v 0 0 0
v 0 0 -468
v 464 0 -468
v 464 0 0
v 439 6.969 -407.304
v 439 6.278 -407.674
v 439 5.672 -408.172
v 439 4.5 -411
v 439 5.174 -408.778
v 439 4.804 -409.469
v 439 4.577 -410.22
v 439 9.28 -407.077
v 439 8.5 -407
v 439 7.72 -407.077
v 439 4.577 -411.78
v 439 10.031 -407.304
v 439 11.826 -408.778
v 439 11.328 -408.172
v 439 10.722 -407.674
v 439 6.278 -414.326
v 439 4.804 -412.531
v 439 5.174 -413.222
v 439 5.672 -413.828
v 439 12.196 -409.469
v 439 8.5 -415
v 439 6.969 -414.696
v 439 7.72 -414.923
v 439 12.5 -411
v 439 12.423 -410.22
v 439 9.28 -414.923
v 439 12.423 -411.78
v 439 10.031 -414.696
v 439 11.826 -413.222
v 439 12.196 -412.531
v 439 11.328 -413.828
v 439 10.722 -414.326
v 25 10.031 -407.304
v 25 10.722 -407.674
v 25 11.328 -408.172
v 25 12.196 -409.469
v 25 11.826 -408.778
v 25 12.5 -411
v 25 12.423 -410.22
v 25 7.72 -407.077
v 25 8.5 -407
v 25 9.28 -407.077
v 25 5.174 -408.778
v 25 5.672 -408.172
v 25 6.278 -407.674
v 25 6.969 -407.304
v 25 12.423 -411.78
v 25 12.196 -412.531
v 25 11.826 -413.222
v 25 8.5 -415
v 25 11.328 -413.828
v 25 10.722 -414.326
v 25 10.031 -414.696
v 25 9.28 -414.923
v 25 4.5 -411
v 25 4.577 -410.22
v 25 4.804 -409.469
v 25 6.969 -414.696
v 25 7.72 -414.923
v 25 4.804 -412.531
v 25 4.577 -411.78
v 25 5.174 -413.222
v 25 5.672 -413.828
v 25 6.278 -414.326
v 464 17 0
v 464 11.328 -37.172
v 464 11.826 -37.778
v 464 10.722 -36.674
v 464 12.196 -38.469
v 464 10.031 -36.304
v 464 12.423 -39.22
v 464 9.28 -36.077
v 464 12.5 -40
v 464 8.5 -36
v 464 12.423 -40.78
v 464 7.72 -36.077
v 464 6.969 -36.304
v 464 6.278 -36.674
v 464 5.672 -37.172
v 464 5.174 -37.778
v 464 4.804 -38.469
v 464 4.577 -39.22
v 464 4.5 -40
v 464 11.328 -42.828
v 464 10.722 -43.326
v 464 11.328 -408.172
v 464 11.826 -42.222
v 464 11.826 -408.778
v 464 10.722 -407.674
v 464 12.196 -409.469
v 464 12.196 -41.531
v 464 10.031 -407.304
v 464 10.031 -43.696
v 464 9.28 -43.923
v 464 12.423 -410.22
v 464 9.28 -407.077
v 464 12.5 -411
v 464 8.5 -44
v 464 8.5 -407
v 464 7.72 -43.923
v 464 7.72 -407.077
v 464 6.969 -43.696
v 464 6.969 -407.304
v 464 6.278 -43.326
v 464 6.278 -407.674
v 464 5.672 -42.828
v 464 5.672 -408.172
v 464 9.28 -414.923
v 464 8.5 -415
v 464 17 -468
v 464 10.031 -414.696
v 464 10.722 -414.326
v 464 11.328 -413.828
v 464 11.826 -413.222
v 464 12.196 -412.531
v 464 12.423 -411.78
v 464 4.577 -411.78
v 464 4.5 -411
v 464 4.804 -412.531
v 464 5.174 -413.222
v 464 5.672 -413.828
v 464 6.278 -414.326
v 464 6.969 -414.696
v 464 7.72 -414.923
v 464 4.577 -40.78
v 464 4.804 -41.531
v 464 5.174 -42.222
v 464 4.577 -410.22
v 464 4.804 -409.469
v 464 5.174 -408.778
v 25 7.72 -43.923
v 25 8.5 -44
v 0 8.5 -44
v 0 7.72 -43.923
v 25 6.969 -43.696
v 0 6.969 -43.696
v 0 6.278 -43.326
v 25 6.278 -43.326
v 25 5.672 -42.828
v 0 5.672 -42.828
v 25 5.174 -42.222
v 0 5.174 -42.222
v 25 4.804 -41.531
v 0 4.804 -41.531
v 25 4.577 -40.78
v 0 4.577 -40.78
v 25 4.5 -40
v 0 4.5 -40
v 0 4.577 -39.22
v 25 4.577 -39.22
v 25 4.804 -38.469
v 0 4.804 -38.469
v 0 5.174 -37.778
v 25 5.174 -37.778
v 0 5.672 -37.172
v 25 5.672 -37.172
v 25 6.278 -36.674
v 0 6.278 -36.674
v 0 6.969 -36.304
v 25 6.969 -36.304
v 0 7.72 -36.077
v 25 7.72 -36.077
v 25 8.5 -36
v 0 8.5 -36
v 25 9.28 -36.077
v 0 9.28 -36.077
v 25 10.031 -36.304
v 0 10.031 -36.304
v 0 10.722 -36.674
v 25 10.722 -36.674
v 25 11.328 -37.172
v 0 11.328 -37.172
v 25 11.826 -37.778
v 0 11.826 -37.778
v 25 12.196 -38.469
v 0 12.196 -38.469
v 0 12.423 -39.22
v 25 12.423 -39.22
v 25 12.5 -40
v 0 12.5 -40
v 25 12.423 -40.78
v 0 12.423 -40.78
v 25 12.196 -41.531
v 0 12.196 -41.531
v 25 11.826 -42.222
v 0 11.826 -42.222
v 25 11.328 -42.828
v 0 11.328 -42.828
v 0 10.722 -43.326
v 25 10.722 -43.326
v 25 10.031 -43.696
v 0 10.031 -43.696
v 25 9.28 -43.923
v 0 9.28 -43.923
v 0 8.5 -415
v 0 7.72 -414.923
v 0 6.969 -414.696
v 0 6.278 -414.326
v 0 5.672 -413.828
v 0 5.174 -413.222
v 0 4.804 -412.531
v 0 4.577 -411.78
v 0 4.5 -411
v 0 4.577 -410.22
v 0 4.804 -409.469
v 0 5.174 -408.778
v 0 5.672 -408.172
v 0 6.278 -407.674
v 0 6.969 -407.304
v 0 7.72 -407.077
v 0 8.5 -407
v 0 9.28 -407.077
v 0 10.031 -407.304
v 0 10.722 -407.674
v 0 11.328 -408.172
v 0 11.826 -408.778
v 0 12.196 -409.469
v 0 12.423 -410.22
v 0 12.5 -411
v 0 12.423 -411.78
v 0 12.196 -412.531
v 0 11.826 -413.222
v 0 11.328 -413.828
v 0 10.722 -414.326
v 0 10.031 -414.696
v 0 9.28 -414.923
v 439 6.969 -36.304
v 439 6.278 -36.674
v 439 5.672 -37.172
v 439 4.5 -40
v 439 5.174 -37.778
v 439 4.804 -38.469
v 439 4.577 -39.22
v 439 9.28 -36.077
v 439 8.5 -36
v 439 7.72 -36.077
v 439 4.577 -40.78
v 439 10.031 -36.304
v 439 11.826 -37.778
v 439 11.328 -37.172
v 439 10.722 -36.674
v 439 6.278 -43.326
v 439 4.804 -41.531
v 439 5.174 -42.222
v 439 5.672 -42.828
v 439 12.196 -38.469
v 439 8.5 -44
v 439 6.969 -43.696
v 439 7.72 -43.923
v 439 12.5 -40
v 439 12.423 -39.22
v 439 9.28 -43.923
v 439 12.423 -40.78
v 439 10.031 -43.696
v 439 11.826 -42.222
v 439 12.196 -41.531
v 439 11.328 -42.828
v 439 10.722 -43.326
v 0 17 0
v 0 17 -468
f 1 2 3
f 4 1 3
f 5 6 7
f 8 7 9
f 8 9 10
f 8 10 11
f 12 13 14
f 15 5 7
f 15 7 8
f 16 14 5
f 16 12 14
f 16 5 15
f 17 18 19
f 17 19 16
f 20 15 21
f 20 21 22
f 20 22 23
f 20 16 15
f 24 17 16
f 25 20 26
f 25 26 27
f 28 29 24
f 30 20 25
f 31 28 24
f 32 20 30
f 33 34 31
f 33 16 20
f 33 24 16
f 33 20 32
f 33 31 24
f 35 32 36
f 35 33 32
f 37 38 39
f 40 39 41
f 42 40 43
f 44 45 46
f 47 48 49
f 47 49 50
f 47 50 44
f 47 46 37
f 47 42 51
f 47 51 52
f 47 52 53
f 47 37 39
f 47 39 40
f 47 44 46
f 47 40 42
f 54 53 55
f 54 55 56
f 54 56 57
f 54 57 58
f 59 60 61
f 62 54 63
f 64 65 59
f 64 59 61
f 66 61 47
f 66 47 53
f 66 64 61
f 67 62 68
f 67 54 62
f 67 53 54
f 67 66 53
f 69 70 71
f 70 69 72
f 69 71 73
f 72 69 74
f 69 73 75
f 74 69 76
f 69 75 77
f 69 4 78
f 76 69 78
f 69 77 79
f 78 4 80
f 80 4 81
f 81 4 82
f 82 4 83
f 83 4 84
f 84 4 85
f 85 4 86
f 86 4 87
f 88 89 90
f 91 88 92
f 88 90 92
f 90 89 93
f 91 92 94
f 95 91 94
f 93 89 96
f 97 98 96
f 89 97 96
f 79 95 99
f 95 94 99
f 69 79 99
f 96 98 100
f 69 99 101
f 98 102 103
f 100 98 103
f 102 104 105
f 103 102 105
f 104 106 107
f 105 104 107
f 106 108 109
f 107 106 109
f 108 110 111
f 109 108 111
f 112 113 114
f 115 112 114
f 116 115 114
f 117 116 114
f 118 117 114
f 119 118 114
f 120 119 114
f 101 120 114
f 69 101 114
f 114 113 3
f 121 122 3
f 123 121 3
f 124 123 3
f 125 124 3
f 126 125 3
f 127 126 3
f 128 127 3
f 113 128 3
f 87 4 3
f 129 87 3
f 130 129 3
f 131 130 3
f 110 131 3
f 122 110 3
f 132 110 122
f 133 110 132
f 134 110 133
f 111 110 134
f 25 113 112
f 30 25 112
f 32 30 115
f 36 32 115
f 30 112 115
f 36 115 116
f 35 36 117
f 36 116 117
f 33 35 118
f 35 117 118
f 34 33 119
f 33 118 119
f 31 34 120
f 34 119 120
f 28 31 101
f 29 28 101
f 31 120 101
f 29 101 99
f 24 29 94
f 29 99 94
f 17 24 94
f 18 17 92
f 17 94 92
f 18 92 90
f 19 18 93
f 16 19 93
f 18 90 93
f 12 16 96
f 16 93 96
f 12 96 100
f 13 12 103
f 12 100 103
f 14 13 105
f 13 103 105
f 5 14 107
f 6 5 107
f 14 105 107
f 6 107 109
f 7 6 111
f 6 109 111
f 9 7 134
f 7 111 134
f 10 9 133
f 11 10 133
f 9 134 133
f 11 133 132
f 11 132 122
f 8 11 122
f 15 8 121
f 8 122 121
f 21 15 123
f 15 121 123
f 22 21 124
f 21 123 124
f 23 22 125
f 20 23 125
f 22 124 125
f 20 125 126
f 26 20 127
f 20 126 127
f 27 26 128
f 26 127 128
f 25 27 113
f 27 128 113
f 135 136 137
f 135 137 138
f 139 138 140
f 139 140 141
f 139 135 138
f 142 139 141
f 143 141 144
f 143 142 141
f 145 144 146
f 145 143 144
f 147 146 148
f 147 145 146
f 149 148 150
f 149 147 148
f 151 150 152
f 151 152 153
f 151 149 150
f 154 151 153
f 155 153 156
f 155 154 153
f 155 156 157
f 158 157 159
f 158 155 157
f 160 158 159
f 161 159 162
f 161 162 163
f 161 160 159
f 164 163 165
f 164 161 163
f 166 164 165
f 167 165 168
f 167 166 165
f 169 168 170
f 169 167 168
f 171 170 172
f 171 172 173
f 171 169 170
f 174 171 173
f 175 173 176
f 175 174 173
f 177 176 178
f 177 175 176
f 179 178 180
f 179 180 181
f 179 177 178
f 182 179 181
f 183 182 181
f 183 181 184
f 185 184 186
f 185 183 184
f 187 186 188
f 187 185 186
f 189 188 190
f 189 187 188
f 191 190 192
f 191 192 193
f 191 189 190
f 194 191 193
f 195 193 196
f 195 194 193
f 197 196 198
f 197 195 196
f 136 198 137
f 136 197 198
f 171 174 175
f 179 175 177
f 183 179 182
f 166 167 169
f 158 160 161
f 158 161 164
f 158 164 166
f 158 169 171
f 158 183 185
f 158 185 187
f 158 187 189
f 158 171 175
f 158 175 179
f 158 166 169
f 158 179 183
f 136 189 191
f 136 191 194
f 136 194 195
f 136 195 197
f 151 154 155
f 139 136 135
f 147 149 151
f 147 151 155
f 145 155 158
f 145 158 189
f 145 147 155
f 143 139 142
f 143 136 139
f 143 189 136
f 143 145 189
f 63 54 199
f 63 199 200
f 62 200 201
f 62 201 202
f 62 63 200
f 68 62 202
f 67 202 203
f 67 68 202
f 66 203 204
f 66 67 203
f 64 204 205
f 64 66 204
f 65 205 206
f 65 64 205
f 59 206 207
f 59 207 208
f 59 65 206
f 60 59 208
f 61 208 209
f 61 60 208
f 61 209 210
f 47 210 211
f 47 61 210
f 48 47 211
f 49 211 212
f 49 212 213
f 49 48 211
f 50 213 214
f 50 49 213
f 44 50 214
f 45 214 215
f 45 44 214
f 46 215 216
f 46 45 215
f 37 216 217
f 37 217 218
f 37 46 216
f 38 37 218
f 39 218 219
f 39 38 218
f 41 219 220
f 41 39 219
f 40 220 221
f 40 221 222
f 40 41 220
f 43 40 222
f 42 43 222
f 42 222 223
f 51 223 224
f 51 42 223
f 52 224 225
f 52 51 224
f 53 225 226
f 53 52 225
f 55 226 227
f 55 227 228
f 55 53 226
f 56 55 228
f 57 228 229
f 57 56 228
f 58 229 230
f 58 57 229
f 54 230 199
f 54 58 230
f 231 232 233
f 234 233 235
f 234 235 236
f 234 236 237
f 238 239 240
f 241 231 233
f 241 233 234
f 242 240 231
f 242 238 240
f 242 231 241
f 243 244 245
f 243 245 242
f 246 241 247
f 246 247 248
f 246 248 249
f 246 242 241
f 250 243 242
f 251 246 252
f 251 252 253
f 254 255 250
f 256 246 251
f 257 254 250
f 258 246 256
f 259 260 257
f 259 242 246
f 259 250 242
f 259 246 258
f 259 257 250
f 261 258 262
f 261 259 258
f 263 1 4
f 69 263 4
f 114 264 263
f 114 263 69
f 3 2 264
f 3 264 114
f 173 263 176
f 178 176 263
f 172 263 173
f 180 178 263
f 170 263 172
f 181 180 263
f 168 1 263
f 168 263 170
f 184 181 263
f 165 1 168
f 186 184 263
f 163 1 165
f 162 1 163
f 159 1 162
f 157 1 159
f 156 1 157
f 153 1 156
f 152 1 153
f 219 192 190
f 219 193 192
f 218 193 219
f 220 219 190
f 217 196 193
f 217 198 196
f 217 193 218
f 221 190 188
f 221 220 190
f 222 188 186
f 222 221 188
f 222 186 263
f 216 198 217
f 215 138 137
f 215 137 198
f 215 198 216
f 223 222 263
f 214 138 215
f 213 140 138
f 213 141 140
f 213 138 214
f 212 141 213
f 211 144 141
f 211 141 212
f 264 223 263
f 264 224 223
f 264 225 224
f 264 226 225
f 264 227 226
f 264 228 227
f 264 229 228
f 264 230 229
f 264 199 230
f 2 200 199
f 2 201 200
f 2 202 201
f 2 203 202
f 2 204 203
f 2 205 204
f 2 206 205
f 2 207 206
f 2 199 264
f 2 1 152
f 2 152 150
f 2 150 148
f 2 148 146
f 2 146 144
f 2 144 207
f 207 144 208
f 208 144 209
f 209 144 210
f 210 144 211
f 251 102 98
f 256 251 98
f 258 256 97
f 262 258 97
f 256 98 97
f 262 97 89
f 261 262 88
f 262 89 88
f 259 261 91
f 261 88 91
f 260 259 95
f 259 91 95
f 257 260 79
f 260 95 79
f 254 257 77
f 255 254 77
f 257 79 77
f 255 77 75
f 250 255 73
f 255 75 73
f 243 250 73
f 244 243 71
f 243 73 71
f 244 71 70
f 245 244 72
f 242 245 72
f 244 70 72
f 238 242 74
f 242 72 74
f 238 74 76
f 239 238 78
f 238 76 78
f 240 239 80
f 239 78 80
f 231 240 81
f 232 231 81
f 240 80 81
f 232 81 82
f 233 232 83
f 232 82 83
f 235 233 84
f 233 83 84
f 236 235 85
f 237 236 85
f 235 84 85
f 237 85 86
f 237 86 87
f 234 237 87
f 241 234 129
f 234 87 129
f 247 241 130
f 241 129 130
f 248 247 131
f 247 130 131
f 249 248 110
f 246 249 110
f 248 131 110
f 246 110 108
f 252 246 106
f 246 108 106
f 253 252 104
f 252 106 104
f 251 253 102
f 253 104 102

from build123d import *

# Parameters (mm, degrees)
SKETCH1_W           = 464
SKETCH1_H           = 468
BOSS_EXTRUDE1_DEPTH = 17
SKETCH3_R           = 4
CUT_EXTRUDE1_DEPTH  = 25
CUT_EXTRUDE2_START  = -25
SKETCH4_R           = 4
CUT_EXTRUDE2_DEPTH  = 25


with BuildPart() as part:
    # Sketch1 → Boss-Extrude1 (new body)
    with BuildSketch(Plane(origin=(0, 0, 0), x_dir=(1, 0, 0), z_dir=(0, 1, 0))):
        with Locations((232, 234)):
            Rectangle(SKETCH1_W, SKETCH1_H)
    extrude(amount=BOSS_EXTRUDE1_DEPTH)

    # Sketch3 → Cut-Extrude1 (cut)
    with BuildSketch(Plane(origin=(464, 0, 0), x_dir=(0, 0, -1), z_dir=(1, 0, 0))):
        with Locations((40, 8.5)):
            Circle(SKETCH3_R)
        with Locations((411, 8.5)):
            Circle(SKETCH3_R)
    extrude(amount=-CUT_EXTRUDE1_DEPTH, mode=Mode.SUBTRACT)

    # Sketch4 → Cut-Extrude2 (cut)
    with BuildSketch(Plane.ZY.offset(CUT_EXTRUDE2_START)):
        with Locations(Location((-411, 8.5, 0), (0, 0, 180))):
            Circle(SKETCH4_R)
        with Locations(Location((-40, 8.5, 0), (0, 0, 180))):
            Circle(SKETCH4_R)
    extrude(amount=CUT_EXTRUDE2_DEPTH, mode=Mode.SUBTRACT)


solid = part.part
